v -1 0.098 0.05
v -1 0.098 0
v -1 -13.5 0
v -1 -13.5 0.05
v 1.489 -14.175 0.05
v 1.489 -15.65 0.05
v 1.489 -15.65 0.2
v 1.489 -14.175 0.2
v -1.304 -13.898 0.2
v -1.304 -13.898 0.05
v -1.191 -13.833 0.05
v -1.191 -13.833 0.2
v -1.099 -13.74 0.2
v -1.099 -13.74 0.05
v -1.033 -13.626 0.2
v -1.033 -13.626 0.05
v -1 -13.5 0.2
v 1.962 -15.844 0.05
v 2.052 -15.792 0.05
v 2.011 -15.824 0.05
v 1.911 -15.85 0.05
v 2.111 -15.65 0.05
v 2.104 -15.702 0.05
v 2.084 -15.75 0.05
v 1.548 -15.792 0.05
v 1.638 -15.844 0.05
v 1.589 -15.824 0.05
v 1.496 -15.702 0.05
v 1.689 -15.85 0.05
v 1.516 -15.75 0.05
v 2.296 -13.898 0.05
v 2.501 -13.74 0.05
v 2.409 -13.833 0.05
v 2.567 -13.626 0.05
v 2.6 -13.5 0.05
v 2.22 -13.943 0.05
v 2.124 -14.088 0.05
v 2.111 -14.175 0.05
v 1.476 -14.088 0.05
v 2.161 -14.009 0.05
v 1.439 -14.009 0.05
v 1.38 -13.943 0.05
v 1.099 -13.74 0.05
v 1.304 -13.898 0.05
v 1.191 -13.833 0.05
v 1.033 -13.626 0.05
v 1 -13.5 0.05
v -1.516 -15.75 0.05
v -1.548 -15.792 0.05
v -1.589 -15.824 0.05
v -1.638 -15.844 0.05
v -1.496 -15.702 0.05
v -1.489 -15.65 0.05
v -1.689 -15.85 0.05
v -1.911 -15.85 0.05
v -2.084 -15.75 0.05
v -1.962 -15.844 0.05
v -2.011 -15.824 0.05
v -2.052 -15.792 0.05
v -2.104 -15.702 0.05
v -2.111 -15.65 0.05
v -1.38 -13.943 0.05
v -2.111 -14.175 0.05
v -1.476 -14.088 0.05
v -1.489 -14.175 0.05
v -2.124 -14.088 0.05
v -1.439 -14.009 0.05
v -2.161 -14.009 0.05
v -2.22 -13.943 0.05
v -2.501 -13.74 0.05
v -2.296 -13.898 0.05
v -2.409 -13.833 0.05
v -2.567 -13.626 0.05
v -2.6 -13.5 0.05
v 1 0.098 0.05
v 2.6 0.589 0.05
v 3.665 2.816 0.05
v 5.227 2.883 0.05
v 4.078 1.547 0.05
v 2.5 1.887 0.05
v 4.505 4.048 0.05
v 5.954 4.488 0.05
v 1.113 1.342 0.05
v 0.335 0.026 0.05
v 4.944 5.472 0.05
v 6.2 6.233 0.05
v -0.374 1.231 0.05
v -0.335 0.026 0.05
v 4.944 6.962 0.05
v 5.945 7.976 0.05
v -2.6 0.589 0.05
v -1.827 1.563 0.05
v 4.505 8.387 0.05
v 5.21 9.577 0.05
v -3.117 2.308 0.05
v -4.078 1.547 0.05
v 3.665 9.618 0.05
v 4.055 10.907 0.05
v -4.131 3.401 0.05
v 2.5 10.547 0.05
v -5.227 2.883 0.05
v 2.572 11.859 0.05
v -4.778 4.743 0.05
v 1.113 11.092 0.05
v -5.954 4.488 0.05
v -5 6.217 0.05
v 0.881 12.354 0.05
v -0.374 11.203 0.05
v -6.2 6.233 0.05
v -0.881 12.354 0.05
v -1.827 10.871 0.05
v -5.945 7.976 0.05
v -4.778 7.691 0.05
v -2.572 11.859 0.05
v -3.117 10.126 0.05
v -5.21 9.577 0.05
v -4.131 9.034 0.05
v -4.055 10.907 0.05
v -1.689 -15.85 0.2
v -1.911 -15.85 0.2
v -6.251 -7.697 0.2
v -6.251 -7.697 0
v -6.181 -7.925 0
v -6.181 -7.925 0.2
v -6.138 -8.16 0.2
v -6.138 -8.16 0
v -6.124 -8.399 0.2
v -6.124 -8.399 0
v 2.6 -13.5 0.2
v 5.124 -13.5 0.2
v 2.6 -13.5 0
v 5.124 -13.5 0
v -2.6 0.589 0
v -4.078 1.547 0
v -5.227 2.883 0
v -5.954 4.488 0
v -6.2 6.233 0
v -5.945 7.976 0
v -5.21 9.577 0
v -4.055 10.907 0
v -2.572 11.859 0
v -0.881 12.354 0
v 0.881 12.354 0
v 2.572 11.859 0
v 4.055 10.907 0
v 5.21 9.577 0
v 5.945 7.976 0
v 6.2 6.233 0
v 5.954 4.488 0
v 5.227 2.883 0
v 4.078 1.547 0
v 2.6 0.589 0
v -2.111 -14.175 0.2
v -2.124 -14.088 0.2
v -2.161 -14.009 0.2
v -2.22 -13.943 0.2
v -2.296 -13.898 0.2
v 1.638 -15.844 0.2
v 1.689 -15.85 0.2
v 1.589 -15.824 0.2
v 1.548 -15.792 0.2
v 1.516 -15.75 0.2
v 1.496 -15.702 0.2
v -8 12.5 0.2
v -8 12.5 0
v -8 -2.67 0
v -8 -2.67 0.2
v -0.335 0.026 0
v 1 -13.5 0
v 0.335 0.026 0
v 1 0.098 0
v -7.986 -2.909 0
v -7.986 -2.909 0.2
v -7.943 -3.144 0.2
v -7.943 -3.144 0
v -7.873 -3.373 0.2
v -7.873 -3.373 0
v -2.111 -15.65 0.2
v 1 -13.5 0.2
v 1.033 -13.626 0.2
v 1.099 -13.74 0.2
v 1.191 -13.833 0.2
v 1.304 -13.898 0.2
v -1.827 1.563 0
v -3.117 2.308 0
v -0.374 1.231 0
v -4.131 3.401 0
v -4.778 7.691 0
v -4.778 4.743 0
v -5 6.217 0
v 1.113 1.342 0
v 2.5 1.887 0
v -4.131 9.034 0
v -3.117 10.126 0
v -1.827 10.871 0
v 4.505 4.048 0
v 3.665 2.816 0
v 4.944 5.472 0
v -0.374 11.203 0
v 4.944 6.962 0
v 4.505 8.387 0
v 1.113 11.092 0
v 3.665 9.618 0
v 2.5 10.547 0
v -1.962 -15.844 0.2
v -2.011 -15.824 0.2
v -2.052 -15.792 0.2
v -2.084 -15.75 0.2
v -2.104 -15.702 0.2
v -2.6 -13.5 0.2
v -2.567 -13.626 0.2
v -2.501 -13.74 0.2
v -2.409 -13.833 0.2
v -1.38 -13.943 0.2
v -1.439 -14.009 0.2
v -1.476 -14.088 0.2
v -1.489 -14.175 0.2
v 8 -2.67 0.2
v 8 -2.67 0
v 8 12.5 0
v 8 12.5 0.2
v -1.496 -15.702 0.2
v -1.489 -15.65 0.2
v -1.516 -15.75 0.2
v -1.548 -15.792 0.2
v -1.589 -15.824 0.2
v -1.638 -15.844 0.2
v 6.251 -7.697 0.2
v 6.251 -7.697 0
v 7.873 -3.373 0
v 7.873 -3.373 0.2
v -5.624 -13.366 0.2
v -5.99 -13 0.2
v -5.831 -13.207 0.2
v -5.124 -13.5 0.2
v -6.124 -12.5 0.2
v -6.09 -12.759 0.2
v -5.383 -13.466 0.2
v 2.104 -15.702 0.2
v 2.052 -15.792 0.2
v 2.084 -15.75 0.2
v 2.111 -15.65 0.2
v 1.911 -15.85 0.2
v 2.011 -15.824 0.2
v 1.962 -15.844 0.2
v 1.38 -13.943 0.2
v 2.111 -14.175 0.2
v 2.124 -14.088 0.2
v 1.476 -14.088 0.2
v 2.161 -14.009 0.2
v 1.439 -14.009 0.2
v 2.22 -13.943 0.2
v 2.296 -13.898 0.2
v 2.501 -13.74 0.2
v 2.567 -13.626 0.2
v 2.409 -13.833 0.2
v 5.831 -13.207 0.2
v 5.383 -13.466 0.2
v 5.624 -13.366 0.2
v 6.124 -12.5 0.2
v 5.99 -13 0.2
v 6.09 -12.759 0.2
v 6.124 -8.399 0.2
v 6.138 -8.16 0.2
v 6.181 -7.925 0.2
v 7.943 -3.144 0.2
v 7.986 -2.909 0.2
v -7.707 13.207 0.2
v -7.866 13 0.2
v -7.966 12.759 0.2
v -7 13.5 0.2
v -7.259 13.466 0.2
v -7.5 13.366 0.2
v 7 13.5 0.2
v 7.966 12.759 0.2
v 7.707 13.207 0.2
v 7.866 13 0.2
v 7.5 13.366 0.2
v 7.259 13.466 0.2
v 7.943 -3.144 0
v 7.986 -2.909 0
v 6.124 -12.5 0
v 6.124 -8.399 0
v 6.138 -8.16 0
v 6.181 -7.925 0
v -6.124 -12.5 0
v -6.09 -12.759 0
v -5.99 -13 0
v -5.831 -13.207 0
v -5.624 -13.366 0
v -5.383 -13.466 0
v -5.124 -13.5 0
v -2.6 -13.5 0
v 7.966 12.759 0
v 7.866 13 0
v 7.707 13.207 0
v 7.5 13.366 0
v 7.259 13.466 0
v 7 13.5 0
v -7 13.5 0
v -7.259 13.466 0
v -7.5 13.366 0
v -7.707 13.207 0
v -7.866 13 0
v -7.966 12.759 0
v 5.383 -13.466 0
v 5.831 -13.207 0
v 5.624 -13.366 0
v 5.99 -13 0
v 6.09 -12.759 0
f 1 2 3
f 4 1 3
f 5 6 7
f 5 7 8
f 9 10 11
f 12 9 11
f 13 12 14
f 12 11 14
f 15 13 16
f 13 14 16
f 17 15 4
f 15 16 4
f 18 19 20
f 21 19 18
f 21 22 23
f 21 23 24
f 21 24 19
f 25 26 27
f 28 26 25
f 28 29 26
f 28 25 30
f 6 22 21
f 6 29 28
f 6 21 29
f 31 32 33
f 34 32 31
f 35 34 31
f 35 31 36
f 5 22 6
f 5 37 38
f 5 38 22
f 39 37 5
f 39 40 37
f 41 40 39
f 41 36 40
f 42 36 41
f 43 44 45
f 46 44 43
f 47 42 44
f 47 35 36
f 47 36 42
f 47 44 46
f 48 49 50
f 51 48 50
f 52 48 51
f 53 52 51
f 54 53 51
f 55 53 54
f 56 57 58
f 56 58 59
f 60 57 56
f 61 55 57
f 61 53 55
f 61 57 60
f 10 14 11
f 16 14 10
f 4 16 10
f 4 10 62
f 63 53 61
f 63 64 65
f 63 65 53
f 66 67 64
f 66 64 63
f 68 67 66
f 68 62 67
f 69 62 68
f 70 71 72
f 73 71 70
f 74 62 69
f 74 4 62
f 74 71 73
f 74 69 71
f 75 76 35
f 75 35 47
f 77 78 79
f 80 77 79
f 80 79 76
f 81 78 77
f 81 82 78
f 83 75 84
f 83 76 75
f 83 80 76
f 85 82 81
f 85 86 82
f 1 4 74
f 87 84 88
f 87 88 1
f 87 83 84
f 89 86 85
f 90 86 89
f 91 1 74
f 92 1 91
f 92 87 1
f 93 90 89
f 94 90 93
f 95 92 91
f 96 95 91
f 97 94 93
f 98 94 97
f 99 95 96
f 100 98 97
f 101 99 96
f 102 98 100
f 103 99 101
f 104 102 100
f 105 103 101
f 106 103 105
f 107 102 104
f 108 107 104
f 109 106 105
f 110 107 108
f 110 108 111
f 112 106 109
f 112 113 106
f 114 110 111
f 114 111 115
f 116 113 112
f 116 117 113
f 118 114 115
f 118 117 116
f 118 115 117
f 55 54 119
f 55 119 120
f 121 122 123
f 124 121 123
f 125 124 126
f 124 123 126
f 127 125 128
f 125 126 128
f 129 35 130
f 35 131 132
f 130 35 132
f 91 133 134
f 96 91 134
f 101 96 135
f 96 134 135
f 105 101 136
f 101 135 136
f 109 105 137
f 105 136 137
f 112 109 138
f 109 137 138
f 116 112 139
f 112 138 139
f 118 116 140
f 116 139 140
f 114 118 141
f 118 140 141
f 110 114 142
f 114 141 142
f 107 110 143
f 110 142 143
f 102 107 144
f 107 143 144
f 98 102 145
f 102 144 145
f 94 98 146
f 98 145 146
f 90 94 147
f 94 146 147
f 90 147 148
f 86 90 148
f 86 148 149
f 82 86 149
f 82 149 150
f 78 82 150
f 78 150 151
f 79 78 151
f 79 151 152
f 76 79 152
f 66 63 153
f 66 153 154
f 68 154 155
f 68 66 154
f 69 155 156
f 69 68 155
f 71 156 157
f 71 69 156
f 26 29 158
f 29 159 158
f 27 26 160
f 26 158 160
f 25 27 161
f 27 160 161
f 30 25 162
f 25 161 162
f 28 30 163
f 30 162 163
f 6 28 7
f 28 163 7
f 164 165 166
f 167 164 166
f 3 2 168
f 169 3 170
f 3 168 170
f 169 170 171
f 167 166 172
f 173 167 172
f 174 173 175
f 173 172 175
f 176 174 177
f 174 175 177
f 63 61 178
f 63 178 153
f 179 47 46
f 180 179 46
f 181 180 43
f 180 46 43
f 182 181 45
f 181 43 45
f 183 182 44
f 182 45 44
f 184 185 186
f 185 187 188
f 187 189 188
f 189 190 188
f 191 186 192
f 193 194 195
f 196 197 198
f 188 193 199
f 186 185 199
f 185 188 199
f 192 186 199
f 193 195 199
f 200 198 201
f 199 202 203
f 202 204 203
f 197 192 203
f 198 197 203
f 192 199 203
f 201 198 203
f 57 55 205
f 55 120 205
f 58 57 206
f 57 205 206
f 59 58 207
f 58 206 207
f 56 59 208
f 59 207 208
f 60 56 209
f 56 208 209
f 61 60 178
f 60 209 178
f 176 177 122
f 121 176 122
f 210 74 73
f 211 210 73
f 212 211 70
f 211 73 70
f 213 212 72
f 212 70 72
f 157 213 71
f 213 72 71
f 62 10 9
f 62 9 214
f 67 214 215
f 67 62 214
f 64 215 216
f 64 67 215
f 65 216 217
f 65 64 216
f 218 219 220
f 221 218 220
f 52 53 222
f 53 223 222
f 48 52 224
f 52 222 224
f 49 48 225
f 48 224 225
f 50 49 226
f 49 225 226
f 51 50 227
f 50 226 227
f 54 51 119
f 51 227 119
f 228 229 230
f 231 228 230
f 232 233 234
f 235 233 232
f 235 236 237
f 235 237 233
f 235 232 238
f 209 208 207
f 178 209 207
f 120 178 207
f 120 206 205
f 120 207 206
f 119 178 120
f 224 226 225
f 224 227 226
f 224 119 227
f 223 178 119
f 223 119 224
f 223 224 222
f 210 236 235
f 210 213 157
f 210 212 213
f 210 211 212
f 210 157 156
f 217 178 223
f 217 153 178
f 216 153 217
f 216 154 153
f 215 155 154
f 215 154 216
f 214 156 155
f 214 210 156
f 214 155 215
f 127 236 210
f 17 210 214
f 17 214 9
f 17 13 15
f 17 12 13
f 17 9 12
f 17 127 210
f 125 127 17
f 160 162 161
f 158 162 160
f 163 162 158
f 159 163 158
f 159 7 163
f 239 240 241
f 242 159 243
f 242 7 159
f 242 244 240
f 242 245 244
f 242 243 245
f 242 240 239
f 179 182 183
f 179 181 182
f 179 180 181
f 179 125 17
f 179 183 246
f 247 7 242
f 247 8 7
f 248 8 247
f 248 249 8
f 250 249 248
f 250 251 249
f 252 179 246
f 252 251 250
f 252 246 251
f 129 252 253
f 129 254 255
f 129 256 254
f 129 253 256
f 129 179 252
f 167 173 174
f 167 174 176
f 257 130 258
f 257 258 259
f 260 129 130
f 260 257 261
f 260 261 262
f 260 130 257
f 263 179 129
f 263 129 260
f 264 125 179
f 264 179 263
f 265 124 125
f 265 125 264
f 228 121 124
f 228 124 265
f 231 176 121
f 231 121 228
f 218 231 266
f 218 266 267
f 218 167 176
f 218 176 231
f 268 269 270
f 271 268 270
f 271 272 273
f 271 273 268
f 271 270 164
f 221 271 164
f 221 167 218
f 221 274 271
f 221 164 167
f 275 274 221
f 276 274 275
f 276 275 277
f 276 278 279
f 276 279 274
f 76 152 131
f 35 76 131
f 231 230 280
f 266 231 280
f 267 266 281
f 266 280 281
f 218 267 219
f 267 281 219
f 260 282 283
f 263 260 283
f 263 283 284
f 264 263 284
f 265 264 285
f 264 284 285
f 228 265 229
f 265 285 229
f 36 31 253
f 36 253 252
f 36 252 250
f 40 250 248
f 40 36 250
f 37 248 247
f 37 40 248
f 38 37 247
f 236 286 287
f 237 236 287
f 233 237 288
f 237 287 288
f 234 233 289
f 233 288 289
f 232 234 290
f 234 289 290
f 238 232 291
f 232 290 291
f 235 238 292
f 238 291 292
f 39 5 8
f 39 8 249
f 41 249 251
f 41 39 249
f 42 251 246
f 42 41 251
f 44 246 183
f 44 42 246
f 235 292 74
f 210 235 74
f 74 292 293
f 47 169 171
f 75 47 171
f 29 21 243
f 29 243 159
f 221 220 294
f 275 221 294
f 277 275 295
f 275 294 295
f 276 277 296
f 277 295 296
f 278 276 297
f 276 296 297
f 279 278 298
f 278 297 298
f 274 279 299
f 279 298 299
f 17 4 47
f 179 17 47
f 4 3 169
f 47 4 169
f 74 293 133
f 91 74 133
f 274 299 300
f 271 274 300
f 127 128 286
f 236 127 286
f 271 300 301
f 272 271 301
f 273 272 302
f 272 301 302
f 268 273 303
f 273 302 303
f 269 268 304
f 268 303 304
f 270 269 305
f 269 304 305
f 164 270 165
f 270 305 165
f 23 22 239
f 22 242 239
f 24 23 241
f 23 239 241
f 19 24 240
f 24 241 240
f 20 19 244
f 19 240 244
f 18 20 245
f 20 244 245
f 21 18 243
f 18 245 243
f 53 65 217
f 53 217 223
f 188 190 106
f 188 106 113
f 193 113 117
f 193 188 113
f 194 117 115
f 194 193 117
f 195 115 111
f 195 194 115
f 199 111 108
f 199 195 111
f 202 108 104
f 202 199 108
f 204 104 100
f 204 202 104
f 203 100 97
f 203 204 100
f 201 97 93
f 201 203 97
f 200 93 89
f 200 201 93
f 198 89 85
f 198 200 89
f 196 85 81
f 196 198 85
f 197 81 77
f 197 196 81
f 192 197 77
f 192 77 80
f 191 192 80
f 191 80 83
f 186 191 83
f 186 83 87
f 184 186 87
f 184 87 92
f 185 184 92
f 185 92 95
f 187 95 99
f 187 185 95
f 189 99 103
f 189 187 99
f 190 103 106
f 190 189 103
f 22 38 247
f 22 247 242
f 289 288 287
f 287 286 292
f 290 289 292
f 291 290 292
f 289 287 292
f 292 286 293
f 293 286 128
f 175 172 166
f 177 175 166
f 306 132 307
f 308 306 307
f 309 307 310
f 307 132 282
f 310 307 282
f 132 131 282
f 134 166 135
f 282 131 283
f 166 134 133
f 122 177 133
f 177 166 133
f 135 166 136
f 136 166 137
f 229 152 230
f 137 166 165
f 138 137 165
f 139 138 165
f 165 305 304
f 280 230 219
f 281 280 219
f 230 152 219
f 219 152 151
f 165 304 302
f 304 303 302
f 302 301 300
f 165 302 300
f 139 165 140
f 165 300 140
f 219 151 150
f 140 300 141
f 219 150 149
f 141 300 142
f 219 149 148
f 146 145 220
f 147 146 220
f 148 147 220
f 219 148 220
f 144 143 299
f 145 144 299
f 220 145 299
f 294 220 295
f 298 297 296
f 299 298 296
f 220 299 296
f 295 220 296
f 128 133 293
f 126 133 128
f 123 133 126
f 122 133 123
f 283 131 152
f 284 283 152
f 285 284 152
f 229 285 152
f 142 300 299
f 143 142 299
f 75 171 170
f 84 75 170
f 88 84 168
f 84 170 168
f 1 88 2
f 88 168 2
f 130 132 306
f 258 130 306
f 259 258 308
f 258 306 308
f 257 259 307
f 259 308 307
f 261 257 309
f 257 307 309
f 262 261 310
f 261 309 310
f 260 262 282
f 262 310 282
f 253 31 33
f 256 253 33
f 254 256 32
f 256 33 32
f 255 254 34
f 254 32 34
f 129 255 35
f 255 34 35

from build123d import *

# Parameters (mm, degrees)
BOSS_EXTRUDE1_DEPTH = 0.2
SKETCH3_R           = 5
BOSS_EXTRUDE2_DEPTH = 0.2
SKETCH4_R           = 5
CUT_EXTRUDE1_DEPTH  = 0.05
FILLET1_R           = 0.5
FILLET2_R           = 0.2


with BuildPart() as part:
    # Sketch2 → Boss-Extrude1 (new body)
    with BuildSketch(Plane.XY):
        with BuildLine():
            Line((-5.123848106, -13.5), (5.123848106, -13.5))
            ThreePointArc((5.123848106, -13.5), (5.830954887, -13.207106781), (6.123848106, -12.5))
            Line((6.123848106, -12.5), (6.123848106, -8.39885311))
            ThreePointArc((6.123848106, -8.39885311), (6.155941006, -8.042003499), (6.251189751, -7.696606227))
            Line((6.251189751, -7.696606227), (7.872658355, -3.372689949))
            ThreePointArc((7.872658355, -3.372689949), (7.9679071, -3.027292676), (8, -2.670443065))
            Line((8, -2.670443065), (8, 12.5))
            ThreePointArc((8, 12.5), (7.707106781, 13.207106781), (7, 13.5))
            Line((7, 13.5), (-7, 13.5))
            ThreePointArc((-7, 13.5), (-7.707106781, 13.207106781), (-8, 12.5))
            Line((-8, 12.5), (-8, -2.670443065))
            ThreePointArc((-8, -2.670443065), (-7.9679071, -3.027292676), (-7.872658355, -3.372689949))
            Line((-7.872658355, -3.372689949), (-6.251189751, -7.696606227))
            ThreePointArc((-6.251189751, -7.696606227), (-6.155941006, -8.042003499), (-6.123848106, -8.39885311))
            Line((-6.123848106, -8.39885311), (-6.123848106, -12.5))
            ThreePointArc((-6.123848106, -12.5), (-5.830954887, -13.207106781), (-5.123848106, -13.5))
        make_face()
    extrude(amount=BOSS_EXTRUDE1_DEPTH)

    # Sketch3 → Boss-Extrude2 (add)
    with BuildSketch(Plane(origin=(0, 0, 0), x_dir=(-1, 0, 0), z_dir=(0, 0, -1))):
        with BuildLine():
            Line((1, 0.098294397), (1, -13.875268119))
            Line((1, -13.875268119), (1.189324579, -13.875268119))
            ThreePointArc((1.189324579, -13.875268119), (1.401456614, -13.963136085), (1.489324579, -14.175268119))
            Line((1.489324579, -14.175268119), (1.489324579, -15.850374766))
            Line((1.489324579, -15.850374766), (2.110675421, -15.850374766))
            Line((2.110675421, -15.850374766), (2.110675421, -14.175268119))
            ThreePointArc((2.110675421, -14.175268119), (2.198543386, -13.963136085), (2.410675421, -13.875268119))
            Line((2.410675421, -13.875268119), (2.6, -13.875268119))
            Line((2.6, -13.875268119), (2.6, 0.588618902))
            ThreePointArc((2.6, 0.588618902), (0, 12.417117813), (-2.6, 0.588618902))
            Line((-2.6, 0.588618902), (-2.6, -13.875268119))
            Line((-2.6, -13.875268119), (-2.410675421, -13.875268119))
            ThreePointArc((-2.410675421, -13.875268119), (-2.198543386, -13.963136085), (-2.110675421, -14.175268119))
            Line((-2.110675421, -14.175268119), (-2.110675421, -15.850374766))
            Line((-2.110675421, -15.850374766), (-1.489324579, -15.850374766))
            Line((-1.489324579, -15.850374766), (-1.489324579, -14.175268119))
            ThreePointArc((-1.489324579, -14.175268119), (-1.401456614, -13.963136085), (-1.189324579, -13.875268119))
            Line((-1.189324579, -13.875268119), (-1, -13.875268119))
            Line((-1, -13.875268119), (-1, 0.098294397))
            ThreePointArc((-1, 0.098294397), (0, 0.017117813), (1, 0.098294397))
        make_face()
        with Locations((0, 6.217117813)):
            Circle(SKETCH3_R, mode=Mode.SUBTRACT)
    extrude(amount=-BOSS_EXTRUDE2_DEPTH)

    # Sketch4 → Cut-Extrude1 (cut)
    with BuildSketch(Plane(origin=(0, 0, 0), x_dir=(-1, 0, 0), z_dir=(0, 0, -1))):
        with BuildLine():
            Line((1, -13.875268119), (1.189324579, -13.875268119))
            ThreePointArc((1.189324579, -13.875268119), (1.401456614, -13.963136085), (1.489324579, -14.175268119))
            Line((1.489324579, -14.175268119), (1.489324579, -15.850374766))
            Line((1.489324579, -15.850374766), (2.110675421, -15.850374766))
            Line((2.110675421, -15.850374766), (2.110675421, -14.175268119))
            ThreePointArc((2.110675421, -14.175268119), (2.198543386, -13.963136085), (2.410675421, -13.875268119))
            Line((2.410675421, -13.875268119), (2.6, -13.875268119))
            Line((2.6, -13.875268119), (2.6, 0.588618902))
            ThreePointArc((2.6, 0.588618902), (0, 12.417117813), (-2.6, 0.588618902))
            Line((-2.6, 0.588618902), (-2.6, -13.875268119))
            Line((-2.6, -13.875268119), (-2.410675421, -13.875268119))
            ThreePointArc((-2.410675421, -13.875268119), (-2.198543386, -13.963136085), (-2.110675421, -14.175268119))
            Line((-2.110675421, -14.175268119), (-2.110675421, -15.850374766))
            Line((-2.110675421, -15.850374766), (-1.489324579, -15.850374766))
            Line((-1.489324579, -15.850374766), (-1.489324579, -14.175268119))
            ThreePointArc((-1.489324579, -14.175268119), (-1.401456614, -13.963136085), (-1.189324579, -13.875268119))
            Line((-1.189324579, -13.875268119), (-1, -13.875268119))
            Line((-1, -13.875268119), (-1, 0.098294397))
            ThreePointArc((-1, 0.098294397), (0, 0.017117813), (1, 0.098294397))
            Line((1, 0.098294397), (1, -13.875268119))
        make_face()
        with Locations((0, 6.217117813)):
            Circle(SKETCH4_R, mode=Mode.SUBTRACT)
    extrude(amount=-CUT_EXTRUDE1_DEPTH, mode=Mode.SUBTRACT)

    # Fillet1
    # the kernel refuses this fillet: 0.5 mm, written as the material it takes off along each edge
    with BuildSketch(Plane(origin=(-2.6, -13.875268119, -0.888170298), x_dir=(0, 1, 0), z_dir=(0, 0, 1)), Plane(origin=(1, -13.875268119, -0.888170298), x_dir=(0, 1, 0), z_dir=(0, 0, 1))) as fillet1_piece_1:
        with BuildLine():
            CenterArc((0.438912275, -0.49593288), FILLET1_R, 97.312922169, 60.15129319)
            Line((-0.022907897, -0.304302692), (-0.069089914, -0.285139673))
            ThreePointArc((-0.069089914, -0.285139673), (-0.05, -0.189324579), (-0.05, 0))
            Line((-0.05, 0), (0, 0.05))
            ThreePointArc((0, 0.05), (0.18763406, 0.05), (0.368903703, 0.049593288))
            Line((0.368903703, 0.049593288), (0.375268119, 0))
        make_face()
    extrude(amount=2.026340595, mode=Mode.SUBTRACT)
    with BuildSketch(Plane(origin=(-1, -13.875268119, -0.888170298), x_dir=(-0.997178450014068, -0.07506756175300172, 0), z_dir=(0, 0, 1)), Plane(origin=(2.6, -13.875268119, -0.888170298), x_dir=(-0.997178450014068, -0.07506756175300161, 0), z_dir=(0, 0, 1))) as fillet1_piece_2:
        with BuildLine():
            CenterArc((0.461585506, -0.474902334), FILLET1_R, 108.23068039, 60.15129319)
            Line((-0.028170463, -0.374209281), (-0.07714606, -0.364139976))
            ThreePointArc((-0.07714606, -0.364139976), (-0.063944154, -0.183351263), (-0.049858923, 0.003753378))
            Line((-0.049858923, 0.003753378), (0.003753378, 0.049858923))
            ThreePointArc((0.003753378, 0.049858923), (0.192543769, 0.035646788), (0.289521549, 0.047490233))
            Line((0.289521549, 0.047490233), (0.305163727, 0))
        make_face()
    extrude(amount=2.026340595, mode=Mode.SUBTRACT)

    # Fillet2
    fillet2_edges = [part.edges().sort_by_distance(p)[0] for p in [
        (-2.110675421, -15.850374766, 0.125),
        (-1.489324579, -15.850374766, 0.125),
        (1.489324579, -15.850374766, 0.125),
        (2.110675421, -15.850374766, 0.125),
    ]]
    fillet(fillet2_edges, radius=FILLET2_R)


solid = part.part
